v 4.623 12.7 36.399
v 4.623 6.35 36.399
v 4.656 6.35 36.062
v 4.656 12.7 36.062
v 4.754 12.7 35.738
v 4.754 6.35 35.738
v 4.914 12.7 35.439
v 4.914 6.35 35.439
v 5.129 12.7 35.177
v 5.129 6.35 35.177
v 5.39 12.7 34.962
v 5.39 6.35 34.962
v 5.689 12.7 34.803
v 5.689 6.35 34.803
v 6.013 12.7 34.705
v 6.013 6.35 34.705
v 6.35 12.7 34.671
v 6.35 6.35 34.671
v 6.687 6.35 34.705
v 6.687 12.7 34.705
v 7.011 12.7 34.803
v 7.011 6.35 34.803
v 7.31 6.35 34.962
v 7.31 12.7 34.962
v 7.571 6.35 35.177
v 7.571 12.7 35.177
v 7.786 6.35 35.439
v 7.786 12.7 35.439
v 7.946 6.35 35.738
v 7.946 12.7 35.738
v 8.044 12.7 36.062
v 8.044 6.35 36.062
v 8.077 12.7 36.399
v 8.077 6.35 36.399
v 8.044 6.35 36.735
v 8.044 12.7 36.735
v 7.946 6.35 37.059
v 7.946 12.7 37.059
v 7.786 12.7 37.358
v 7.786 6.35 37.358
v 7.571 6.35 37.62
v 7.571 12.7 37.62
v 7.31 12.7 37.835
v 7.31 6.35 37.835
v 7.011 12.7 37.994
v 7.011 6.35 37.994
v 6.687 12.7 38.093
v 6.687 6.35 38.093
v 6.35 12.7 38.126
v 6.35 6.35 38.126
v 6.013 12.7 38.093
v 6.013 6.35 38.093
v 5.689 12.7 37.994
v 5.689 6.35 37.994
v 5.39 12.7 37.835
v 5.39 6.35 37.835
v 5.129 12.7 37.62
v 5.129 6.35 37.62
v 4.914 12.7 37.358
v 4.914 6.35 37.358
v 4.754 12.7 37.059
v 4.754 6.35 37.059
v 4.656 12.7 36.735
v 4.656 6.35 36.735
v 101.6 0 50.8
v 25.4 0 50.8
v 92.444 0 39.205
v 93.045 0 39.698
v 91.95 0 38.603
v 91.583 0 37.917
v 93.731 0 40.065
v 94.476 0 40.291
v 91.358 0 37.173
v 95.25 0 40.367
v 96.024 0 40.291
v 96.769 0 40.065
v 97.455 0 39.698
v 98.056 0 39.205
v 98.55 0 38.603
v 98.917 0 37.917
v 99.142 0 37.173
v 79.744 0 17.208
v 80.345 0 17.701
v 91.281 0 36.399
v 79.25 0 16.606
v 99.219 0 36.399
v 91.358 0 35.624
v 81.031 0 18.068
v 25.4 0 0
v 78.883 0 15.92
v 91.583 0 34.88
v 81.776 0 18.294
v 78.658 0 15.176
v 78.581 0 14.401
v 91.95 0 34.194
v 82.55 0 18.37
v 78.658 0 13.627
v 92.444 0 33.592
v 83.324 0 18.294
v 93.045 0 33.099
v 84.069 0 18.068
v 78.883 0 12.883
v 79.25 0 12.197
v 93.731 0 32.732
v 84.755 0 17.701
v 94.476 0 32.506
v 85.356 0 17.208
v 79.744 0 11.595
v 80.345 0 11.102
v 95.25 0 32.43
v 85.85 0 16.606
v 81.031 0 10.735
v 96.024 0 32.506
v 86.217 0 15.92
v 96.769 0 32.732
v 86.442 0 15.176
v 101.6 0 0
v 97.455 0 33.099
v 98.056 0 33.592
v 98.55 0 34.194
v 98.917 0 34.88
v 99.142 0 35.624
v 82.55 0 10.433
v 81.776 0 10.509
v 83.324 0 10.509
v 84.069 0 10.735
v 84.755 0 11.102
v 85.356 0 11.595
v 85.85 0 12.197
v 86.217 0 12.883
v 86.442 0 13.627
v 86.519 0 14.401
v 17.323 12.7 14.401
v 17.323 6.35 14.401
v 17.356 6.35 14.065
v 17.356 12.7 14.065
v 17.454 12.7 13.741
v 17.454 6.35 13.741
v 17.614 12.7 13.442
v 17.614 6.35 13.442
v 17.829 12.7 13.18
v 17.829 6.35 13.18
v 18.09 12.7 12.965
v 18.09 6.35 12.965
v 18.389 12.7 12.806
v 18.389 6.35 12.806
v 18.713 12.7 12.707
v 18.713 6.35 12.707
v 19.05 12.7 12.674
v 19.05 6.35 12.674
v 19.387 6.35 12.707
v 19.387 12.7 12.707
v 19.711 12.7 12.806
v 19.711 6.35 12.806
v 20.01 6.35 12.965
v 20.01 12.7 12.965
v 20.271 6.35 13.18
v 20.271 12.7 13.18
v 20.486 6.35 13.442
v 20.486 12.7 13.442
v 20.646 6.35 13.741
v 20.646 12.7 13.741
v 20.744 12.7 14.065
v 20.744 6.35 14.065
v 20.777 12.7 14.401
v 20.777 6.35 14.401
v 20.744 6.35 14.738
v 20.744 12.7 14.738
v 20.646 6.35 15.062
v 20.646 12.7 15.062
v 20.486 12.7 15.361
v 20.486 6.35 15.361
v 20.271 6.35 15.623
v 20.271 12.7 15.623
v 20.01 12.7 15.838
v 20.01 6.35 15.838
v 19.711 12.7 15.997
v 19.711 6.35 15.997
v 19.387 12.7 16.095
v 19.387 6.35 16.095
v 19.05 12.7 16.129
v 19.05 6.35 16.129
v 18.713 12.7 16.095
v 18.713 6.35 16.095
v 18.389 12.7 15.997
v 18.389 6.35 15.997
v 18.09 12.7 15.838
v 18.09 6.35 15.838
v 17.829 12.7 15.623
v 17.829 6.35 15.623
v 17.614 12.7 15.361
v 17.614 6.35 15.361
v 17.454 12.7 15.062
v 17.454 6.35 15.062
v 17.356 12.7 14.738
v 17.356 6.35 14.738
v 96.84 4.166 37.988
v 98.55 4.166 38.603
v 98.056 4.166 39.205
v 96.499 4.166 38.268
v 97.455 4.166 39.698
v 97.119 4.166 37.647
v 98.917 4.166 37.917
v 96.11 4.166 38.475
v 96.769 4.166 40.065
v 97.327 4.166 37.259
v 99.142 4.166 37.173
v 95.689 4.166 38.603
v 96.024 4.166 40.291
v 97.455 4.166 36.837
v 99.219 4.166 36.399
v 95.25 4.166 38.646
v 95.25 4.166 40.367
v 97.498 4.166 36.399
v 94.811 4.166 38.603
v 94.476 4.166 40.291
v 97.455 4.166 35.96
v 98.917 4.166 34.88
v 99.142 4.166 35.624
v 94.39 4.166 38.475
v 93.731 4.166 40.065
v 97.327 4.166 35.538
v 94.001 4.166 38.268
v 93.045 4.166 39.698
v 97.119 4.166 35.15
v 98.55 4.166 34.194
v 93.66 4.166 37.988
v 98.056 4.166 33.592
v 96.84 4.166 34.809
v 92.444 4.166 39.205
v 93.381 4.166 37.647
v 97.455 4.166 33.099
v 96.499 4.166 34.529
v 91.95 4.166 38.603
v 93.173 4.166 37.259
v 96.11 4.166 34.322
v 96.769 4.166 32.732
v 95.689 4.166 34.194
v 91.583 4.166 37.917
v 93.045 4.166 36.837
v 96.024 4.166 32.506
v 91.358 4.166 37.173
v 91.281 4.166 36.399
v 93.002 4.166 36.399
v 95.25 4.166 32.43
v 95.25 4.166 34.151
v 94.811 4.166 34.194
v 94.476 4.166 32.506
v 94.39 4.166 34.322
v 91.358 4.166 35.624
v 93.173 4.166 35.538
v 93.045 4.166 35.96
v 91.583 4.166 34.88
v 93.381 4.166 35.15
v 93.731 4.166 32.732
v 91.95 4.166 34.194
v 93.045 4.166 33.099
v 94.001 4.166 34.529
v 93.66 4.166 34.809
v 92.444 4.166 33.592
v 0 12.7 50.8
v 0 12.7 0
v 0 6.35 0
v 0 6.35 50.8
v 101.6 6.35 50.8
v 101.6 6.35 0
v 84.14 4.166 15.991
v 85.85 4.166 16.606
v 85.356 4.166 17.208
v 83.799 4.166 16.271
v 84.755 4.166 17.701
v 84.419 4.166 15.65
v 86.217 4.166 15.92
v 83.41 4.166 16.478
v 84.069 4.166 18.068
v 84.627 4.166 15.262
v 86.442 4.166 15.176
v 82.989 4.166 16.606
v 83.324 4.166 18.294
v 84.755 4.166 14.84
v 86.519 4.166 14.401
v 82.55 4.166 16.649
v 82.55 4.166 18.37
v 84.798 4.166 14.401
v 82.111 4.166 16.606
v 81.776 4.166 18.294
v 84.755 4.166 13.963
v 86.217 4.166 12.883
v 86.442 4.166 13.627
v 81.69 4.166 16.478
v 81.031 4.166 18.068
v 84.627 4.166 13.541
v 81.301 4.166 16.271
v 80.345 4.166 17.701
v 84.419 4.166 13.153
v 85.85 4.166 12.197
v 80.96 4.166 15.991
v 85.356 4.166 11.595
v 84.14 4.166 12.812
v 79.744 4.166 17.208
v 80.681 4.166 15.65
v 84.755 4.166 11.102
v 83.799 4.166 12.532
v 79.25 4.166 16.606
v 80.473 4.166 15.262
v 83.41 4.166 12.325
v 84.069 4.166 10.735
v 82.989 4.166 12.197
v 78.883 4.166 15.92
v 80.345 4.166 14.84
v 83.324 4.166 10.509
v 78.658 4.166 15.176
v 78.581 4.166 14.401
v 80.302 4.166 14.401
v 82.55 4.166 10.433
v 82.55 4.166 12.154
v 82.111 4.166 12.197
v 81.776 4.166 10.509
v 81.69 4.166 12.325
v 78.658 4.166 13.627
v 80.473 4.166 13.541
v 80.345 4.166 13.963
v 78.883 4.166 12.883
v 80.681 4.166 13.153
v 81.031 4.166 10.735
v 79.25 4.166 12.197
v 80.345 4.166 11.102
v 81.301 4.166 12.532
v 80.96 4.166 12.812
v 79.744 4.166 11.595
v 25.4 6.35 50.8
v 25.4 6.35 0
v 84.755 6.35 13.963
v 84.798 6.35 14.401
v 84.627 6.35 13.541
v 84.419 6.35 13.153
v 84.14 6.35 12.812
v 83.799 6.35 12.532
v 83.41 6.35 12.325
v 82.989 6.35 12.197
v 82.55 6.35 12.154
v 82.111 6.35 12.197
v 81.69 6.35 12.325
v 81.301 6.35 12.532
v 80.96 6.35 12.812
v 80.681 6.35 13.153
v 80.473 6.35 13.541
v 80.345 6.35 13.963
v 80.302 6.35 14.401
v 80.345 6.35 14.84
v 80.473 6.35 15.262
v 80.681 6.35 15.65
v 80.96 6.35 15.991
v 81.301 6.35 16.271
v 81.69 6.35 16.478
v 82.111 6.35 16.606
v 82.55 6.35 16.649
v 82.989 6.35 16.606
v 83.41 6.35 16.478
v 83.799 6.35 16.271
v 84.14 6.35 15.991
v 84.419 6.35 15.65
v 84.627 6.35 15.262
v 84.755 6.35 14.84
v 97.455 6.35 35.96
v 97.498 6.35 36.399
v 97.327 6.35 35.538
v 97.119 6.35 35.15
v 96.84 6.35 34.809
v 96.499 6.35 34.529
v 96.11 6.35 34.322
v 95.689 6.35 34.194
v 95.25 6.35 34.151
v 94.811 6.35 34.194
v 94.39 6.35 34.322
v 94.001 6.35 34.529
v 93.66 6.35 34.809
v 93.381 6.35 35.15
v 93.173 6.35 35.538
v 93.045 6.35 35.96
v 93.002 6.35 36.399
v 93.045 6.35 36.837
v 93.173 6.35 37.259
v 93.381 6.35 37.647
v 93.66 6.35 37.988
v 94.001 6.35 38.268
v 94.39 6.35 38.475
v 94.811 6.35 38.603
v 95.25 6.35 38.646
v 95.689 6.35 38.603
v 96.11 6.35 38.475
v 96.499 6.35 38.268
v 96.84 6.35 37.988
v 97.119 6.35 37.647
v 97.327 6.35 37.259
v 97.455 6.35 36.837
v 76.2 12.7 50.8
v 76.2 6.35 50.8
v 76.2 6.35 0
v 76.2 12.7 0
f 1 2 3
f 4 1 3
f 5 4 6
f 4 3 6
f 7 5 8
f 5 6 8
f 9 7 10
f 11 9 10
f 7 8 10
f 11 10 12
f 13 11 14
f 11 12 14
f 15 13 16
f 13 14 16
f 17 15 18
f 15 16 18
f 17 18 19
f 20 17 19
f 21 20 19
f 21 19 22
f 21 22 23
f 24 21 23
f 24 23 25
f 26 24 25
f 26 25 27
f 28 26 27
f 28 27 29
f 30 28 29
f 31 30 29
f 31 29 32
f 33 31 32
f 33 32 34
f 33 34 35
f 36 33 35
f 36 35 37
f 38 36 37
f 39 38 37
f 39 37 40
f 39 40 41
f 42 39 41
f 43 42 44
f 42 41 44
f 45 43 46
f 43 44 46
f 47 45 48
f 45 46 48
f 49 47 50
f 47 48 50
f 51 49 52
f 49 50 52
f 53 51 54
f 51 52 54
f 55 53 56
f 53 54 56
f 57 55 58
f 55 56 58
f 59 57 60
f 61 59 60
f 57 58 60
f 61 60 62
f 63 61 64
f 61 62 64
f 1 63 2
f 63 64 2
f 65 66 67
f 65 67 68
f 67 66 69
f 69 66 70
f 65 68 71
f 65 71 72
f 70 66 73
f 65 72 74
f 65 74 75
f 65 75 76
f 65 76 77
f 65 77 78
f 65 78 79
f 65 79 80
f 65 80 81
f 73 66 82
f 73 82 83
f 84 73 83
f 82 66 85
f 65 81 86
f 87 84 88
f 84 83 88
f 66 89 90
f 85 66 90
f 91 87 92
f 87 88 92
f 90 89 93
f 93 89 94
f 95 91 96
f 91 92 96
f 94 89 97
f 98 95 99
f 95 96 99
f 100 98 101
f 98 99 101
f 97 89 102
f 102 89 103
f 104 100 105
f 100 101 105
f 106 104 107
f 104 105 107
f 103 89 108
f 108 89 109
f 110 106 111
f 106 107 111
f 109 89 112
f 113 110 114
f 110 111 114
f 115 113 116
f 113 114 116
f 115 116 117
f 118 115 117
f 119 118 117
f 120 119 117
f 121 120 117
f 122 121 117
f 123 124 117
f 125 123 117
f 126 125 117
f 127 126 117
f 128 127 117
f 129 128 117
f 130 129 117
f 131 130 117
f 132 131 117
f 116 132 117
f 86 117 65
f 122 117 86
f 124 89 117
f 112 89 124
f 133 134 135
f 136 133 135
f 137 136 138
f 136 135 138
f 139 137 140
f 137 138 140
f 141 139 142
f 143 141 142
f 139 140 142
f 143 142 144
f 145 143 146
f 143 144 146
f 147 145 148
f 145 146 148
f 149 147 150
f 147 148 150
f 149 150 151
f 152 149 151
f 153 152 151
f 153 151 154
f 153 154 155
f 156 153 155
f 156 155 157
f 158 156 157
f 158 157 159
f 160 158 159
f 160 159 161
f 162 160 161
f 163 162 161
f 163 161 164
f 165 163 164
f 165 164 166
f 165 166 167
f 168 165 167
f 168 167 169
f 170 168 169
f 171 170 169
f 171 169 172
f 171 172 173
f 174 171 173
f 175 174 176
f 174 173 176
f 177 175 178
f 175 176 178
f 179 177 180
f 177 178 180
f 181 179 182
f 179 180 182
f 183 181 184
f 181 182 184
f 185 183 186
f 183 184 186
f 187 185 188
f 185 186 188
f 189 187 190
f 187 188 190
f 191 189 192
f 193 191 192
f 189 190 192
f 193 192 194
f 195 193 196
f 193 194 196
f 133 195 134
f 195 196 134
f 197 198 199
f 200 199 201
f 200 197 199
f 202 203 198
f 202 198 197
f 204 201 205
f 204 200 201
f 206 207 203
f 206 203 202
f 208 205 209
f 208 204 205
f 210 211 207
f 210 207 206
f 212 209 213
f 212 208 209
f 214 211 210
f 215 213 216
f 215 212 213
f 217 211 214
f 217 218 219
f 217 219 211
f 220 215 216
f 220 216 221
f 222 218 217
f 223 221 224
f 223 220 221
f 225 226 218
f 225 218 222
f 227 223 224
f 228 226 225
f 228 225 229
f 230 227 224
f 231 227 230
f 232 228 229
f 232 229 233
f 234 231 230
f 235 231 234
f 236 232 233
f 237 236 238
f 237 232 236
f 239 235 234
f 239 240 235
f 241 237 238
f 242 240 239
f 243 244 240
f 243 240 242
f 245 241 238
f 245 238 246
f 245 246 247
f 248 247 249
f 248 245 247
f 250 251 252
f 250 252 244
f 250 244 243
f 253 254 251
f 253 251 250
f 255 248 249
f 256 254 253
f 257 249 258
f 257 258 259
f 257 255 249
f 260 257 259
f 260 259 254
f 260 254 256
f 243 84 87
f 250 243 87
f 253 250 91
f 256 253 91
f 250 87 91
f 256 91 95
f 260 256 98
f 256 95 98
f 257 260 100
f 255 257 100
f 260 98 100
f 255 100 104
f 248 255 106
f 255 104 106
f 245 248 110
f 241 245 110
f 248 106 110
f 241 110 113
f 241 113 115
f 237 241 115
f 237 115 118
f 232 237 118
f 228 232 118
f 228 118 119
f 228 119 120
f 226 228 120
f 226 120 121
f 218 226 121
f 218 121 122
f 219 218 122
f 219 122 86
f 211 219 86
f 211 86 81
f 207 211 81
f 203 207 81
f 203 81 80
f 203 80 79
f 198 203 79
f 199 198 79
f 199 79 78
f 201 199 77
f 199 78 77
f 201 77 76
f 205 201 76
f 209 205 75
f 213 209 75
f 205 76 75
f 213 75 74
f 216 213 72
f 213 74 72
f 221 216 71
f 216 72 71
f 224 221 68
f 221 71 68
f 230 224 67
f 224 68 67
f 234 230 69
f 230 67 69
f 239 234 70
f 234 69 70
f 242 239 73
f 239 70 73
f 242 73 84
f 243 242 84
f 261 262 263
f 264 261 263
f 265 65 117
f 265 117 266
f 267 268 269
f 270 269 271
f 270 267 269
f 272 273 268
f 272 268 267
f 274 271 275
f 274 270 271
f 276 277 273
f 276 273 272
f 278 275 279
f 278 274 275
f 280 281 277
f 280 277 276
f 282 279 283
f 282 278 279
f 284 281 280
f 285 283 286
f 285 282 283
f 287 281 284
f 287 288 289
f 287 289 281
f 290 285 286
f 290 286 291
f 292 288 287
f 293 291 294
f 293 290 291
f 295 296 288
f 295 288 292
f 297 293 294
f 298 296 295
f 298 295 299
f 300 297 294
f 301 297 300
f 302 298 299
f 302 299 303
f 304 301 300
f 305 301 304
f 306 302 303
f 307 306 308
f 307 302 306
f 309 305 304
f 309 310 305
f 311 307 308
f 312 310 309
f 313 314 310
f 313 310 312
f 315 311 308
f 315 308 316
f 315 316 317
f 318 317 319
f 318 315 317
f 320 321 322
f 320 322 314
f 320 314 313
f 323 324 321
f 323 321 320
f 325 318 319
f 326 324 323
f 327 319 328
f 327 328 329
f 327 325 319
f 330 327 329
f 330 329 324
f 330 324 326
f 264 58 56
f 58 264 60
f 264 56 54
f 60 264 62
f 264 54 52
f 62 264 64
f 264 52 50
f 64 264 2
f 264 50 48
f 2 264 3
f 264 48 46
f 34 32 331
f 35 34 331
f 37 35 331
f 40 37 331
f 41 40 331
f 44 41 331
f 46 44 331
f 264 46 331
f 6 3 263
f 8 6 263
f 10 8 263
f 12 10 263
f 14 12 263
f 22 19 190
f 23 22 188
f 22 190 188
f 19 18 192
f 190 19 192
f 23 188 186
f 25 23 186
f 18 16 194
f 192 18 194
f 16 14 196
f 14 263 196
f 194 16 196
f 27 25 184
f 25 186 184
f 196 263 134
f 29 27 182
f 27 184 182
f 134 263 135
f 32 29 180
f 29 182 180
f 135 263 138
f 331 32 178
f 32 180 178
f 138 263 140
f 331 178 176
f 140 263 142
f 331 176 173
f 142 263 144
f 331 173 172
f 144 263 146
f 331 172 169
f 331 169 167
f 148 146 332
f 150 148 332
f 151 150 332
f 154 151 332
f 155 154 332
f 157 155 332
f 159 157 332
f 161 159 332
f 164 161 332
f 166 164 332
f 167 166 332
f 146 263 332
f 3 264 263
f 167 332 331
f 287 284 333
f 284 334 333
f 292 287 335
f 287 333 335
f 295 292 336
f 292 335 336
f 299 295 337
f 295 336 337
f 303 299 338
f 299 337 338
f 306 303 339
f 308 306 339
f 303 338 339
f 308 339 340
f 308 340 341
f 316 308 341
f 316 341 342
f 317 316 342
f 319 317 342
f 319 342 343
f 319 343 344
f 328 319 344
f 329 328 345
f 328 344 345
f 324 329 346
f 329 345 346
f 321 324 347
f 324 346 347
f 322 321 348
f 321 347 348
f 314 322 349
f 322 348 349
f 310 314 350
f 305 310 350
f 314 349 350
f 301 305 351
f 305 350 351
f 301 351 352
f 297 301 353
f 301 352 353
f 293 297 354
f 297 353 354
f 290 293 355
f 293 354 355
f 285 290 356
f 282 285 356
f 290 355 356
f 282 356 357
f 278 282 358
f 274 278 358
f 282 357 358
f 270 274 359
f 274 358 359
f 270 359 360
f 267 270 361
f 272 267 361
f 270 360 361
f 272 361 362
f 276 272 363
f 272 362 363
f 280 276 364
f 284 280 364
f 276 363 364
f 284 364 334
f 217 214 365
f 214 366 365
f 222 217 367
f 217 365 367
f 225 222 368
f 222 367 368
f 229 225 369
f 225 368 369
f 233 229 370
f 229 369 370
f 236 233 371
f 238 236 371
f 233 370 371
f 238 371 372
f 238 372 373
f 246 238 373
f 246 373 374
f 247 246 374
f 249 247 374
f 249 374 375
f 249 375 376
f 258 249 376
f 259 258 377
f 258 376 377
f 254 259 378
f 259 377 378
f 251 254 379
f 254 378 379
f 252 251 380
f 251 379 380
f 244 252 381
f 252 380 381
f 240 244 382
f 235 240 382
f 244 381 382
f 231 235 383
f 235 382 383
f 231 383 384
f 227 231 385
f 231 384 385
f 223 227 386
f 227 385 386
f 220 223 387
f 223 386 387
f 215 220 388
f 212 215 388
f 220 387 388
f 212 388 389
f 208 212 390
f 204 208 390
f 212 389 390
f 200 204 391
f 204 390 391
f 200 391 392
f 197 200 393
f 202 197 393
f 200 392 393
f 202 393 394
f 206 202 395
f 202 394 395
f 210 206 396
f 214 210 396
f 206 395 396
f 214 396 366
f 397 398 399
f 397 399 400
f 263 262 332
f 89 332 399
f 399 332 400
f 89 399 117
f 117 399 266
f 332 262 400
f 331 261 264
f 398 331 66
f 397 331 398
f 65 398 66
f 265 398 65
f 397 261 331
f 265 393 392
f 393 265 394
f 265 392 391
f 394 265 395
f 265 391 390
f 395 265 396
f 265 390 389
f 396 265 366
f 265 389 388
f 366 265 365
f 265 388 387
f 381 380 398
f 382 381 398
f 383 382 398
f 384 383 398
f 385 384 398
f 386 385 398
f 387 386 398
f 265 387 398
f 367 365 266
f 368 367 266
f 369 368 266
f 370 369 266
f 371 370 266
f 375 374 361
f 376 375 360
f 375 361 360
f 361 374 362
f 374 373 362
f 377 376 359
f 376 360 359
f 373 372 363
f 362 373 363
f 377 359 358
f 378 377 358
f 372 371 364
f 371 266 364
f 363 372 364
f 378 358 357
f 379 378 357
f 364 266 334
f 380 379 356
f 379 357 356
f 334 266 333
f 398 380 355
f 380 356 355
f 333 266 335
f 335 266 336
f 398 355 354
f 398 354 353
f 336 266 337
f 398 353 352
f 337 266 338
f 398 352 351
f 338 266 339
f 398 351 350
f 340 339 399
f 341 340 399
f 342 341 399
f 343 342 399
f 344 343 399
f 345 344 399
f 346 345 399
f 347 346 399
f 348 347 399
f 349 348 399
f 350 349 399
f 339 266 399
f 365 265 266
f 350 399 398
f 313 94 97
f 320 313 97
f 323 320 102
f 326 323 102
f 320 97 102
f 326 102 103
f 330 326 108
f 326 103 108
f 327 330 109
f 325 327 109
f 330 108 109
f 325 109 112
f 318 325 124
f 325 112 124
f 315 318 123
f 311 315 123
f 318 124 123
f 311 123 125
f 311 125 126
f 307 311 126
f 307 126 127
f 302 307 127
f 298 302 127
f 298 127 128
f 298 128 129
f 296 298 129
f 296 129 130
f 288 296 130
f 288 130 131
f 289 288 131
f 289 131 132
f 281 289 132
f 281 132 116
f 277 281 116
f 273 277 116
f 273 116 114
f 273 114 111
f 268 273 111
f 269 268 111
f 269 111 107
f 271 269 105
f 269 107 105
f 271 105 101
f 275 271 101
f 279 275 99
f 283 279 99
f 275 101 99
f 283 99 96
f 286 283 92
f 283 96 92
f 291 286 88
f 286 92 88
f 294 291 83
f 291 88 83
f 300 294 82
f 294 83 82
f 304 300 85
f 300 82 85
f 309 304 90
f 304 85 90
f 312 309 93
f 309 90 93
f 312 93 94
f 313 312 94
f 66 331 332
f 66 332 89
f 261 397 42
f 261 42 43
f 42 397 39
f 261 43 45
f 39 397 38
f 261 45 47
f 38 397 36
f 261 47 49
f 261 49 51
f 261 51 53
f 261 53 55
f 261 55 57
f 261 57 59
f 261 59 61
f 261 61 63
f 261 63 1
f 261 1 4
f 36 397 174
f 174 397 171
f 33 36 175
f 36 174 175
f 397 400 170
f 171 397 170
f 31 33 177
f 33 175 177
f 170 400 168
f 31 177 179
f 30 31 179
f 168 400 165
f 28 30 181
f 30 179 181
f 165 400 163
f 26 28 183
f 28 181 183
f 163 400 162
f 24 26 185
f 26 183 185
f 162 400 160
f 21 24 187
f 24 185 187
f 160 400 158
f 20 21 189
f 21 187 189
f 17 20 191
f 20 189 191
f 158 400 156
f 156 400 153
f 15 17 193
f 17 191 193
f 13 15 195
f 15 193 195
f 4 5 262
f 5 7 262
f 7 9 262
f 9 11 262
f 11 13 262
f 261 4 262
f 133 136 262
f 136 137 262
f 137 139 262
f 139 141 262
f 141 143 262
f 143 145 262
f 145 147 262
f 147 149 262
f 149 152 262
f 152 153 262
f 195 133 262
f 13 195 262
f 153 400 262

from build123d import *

# Parameters (mm, degrees)
BOSS_EXTRUDE1_DEPTH                            = 50.8
F_8_32_TAPPED_HOLE1_D                          = 3.4544
CBORE_FOR_8_SOCKET_HEAD_CAP_SCREW1_D           = 4.4958
CBORE_FOR_8_SOCKET_HEAD_CAP_SCREW1_CBORE_D     = 7.9375
CBORE_FOR_8_SOCKET_HEAD_CAP_SCREW1_CBORE_DEPTH = 4.1656


with BuildPart() as part:
    # Sketch1 → Boss-Extrude1 (new body)
    with BuildSketch(Plane.XY):
        Polygon((25.4, 6.35), (25.4, 0), (101.6, 0), (101.6, 6.35), (76.2, 6.35), (76.2, 12.7), (0, 12.7), (0, 6.35), align=None)
    extrude(amount=BOSS_EXTRUDE1_DEPTH)

    # #8-32 Tapped Hole1 (through all)
    with Locations(Plane(origin=(0, 12.7, 0), x_dir=(1, 0, 0), z_dir=(0, 1, 0))):
        with Locations((6.35, -36.398522628), (19.05, -14.401477372)):
            Hole(F_8_32_TAPPED_HOLE1_D / 2)

    # CBORE for #8 Socket Head Cap Screw1 (through all)
    with Locations(Plane(origin=(0, 0, 0), x_dir=(-1, 0, 0), z_dir=(0, -1, 0))):
        with Locations((-95.25, -36.398522628), (-82.55, -14.401477372)):
            CounterBoreHole(CBORE_FOR_8_SOCKET_HEAD_CAP_SCREW1_D / 2, CBORE_FOR_8_SOCKET_HEAD_CAP_SCREW1_CBORE_D / 2, CBORE_FOR_8_SOCKET_HEAD_CAP_SCREW1_CBORE_DEPTH)


solid = part.part
